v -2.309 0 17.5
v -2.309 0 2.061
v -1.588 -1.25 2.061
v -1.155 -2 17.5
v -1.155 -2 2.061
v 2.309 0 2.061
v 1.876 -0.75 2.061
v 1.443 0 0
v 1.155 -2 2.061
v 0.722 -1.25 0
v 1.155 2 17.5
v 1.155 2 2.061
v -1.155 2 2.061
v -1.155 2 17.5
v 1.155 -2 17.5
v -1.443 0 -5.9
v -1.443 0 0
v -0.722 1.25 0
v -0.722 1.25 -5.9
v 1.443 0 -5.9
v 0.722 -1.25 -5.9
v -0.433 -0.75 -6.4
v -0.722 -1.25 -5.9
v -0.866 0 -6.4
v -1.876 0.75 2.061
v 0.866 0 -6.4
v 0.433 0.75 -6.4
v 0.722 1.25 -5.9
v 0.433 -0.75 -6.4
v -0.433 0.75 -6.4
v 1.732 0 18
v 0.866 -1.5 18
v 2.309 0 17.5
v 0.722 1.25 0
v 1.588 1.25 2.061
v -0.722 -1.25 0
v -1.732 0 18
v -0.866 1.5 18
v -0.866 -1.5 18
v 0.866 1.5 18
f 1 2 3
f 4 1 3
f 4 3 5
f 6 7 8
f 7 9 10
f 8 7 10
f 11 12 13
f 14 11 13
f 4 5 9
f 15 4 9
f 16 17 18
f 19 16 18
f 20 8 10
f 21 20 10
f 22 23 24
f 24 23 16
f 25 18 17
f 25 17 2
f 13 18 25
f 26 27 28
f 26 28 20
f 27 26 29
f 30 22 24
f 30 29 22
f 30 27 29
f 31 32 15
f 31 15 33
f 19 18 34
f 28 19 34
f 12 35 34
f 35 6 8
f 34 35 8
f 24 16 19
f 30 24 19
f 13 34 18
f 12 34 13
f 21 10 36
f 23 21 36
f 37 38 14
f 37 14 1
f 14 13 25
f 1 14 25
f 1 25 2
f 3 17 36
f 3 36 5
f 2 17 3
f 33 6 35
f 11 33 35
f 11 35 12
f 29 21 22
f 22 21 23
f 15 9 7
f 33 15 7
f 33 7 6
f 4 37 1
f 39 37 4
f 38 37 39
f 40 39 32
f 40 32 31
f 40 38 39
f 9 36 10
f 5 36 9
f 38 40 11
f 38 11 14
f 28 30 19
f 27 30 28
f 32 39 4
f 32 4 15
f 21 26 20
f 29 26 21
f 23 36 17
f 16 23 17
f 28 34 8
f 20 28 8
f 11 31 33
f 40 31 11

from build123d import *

# Parameters (mm, degrees)
EXTRUDE_1_DEPTH  = 18
CHAMFER_1_SIZE   = 0.5
EXTRUDE_2_DEPTH  = 6.4
CHAMFER_3_SIZE   = 0.75
CHAMFER_3_SIZE_2 = 2.060608065
CHAMFER_4_SIZE   = 0.5


with BuildPart() as part:
    # 草图1 → 凸台-拉伸1 (new body)
    with BuildSketch(Plane.XY):
        Polygon((2.309401077, 0), (1.154700538, 2), (-1.154700538, 2), (-2.309401077, 0), (-1.154700538, -2), (1.154700538, -2), align=None)
    extrude(amount=EXTRUDE_1_DEPTH)

    # 倒角1
    chamfer_1_edges = [part.edges().sort_by_distance(p)[0] for p in [
        (0, 2, 18),
        (-1.732050808, 1, 18),
        (-1.732050808, -1, 18),
        (0, -2, 18),
        (1.732050808, -1, 18),
        (1.732050808, 1, 18),
    ]]
    chamfer(chamfer_1_edges, length=CHAMFER_1_SIZE)

    # 草图2 → 凸台-拉伸2 (add)
    with BuildSketch(Plane(origin=(0, 0, 0), x_dir=(-1, 0, 0), z_dir=(0, 0, -1))):
        Polygon((1.443375673, 0), (0.721687836, 1.25), (-0.721687836, 1.25), (-1.443375673, 0), (-0.721687836, -1.25), (0.721687836, -1.25), align=None)
    extrude(amount=EXTRUDE_2_DEPTH)

    # 倒角3
    # the kernel refuses this chamfer: 2.060608065, 0.75 mm, written as the material it takes off along each edge
    with BuildSketch(Plane(origin=(-6.500319125, -2, 0), x_dir=(-1.0524294974817634e-14, 0.9950833631817486, -0.09904090225205059), z_dir=(1, 0, 0))) as chamfer_3_piece_1_section:
        Polygon((CHAMFER_3_SIZE * 0.995083363182, CHAMFER_3_SIZE * 0.0990409022521), (-CHAMFER_3_SIZE_2 * 0.0990409022324, CHAMFER_3_SIZE_2 * 0.995083362984), (0, 0), align=None)
    chamfer_3_piece_1 = extrude(amount=13.000638251, mode=Mode.PRIVATE)
    chamfer_3_piece_1 = split(chamfer_3_piece_1, bisect_by=Plane(origin=(-1.179179606, -0.457601011, 0.71229118), z_dir=(-0.8660254037844392, -0.4999999999999994, 0)), keep=Keep.TOP, mode=Mode.PRIVATE)
    chamfer_3_piece_1 = split(chamfer_3_piece_1, bisect_by=Plane(origin=(-3.459667972, -1.25, 0.71229118), z_dir=(0, -1, 0)), keep=Keep.TOP, mode=Mode.PRIVATE)
    add(chamfer_3_piece_1, mode=Mode.SUBTRACT)
    with BuildSketch(Plane(origin=(-6.500319125, -2, 0), x_dir=(-1.0524294974817634e-14, 0.9950833631817486, -0.09904090225205059), z_dir=(1, 0, 0))) as chamfer_3_piece_2_section:
        Polygon((CHAMFER_3_SIZE * 0.995083363182, CHAMFER_3_SIZE * 0.0990409022521), (-CHAMFER_3_SIZE_2 * 0.0990409022324, CHAMFER_3_SIZE_2 * 0.995083362984), (0, 0), align=None)
    chamfer_3_piece_2 = extrude(amount=13.000638251, mode=Mode.PRIVATE)
    chamfer_3_piece_2 = split(chamfer_3_piece_2, bisect_by=Plane(origin=(-0.338481018, -1.91373368, 0.629088335), z_dir=(0.8660254037844392, 0.4999999999999994, 0)), keep=Keep.TOP, mode=Mode.PRIVATE)
    chamfer_3_piece_2 = split(chamfer_3_piece_2, bisect_by=Plane(origin=(0, -1.25, 0.629088335), z_dir=(0, -1, 0)), keep=Keep.TOP, mode=Mode.PRIVATE)
    chamfer_3_piece_2 = split(chamfer_3_piece_2, bisect_by=Plane(origin=(0.338481018, -1.91373368, 0.629088335), z_dir=(-0.8660254037844385, 0.5000000000000003, 0)), keep=Keep.TOP, mode=Mode.PRIVATE)
    add(chamfer_3_piece_2, mode=Mode.SUBTRACT)
    with BuildSketch(Plane(origin=(-6.500319125, -2, 0), x_dir=(-1.0524294974817634e-14, 0.9950833631817486, -0.09904090225205059), z_dir=(1, 0, 0))) as chamfer_3_piece_3_section:
        Polygon((CHAMFER_3_SIZE * 0.995083363182, CHAMFER_3_SIZE * 0.0990409022521), (-CHAMFER_3_SIZE_2 * 0.0990409022324, CHAMFER_3_SIZE_2 * 0.995083362984), (0, 0), align=None)
    chamfer_3_piece_3 = extrude(amount=13.000638251, mode=Mode.PRIVATE)
    chamfer_3_piece_3 = split(chamfer_3_piece_3, bisect_by=Plane(origin=(3.459667972, -1.25, 0.71229118), z_dir=(0, -1, 0)), keep=Keep.TOP, mode=Mode.PRIVATE)
    chamfer_3_piece_3 = split(chamfer_3_piece_3, bisect_by=Plane(origin=(1.179179606, -0.457601011, 0.71229118), z_dir=(0.8660254037844385, -0.5000000000000003, 0)), keep=Keep.TOP, mode=Mode.PRIVATE)
    add(chamfer_3_piece_3, mode=Mode.SUBTRACT)
    with BuildSketch(Plane(origin=(-4.98221037, 4.629441495, 0), x_dir=(0.8617674713986471, 0.49754168159088125, -0.09904090225205053), z_dir=(0.500000000000007, -0.8660254037844347, 0))) as chamfer_3_piece_4_section:
        Polygon((CHAMFER_3_SIZE * 0.995083363182, CHAMFER_3_SIZE * 0.0990409022521), (-CHAMFER_3_SIZE_2 * 0.0990409022324, CHAMFER_3_SIZE_2 * 0.995083362984), (0, 0), align=None)
    chamfer_3_piece_4 = extrude(amount=13.000638251, mode=Mode.PRIVATE)
    chamfer_3_piece_4 = split(chamfer_3_piece_4, bisect_by=Plane(origin=(-2.812365741, 2.371160352, 0.71229118), z_dir=(-0.8660254037844392, -0.4999999999999994, 0)), keep=Keep.TOP, mode=Mode.PRIVATE)
    chamfer_3_piece_4 = split(chamfer_3_piece_4, bisect_by=Plane(origin=(-0.985883903, 0.792398989, 0.71229118), z_dir=(-0.8660254037844387, 0.5000000000000003, 0)), keep=Keep.TOP, mode=Mode.PRIVATE)
    add(chamfer_3_piece_4, mode=Mode.SUBTRACT)
    with BuildSketch(Plane(origin=(-4.98221037, 4.629441495, 0), x_dir=(0.8617674713986471, 0.49754168159088125, -0.09904090225205053), z_dir=(0.500000000000007, -0.8660254037844347, 0))) as chamfer_3_piece_5_section:
        Polygon((CHAMFER_3_SIZE * 0.995083363182, CHAMFER_3_SIZE * 0.0990409022521), (-CHAMFER_3_SIZE_2 * 0.0990409022324, CHAMFER_3_SIZE_2 * 0.995083362984), (0, 0), align=None)
    chamfer_3_piece_5 = extrude(amount=13.000638251, mode=Mode.PRIVATE)
    chamfer_3_piece_5 = split(chamfer_3_piece_5, bisect_by=Plane(origin=(-1.082531755, -0.625, 0.629088335), z_dir=(-0.8660254037844392, -0.4999999999999994, 0)), keep=Keep.TOP, mode=Mode.PRIVATE)
    chamfer_3_piece_5 = split(chamfer_3_piece_5, bisect_by=Plane(origin=(-1.488101474, -1.25, 0.629088335), z_dir=(0, 1, 0)), keep=Keep.TOP, mode=Mode.PRIVATE)
    chamfer_3_piece_5 = split(chamfer_3_piece_5, bisect_by=Plane(origin=(-1.826582492, -0.66373368, 0.629088335), z_dir=(0.8660254037844387, -0.5000000000000003, 0)), keep=Keep.TOP, mode=Mode.PRIVATE)
    add(chamfer_3_piece_5, mode=Mode.SUBTRACT)
    with BuildSketch(Plane(origin=(-4.98221037, 4.629441495, 0), x_dir=(0.8617674713986471, 0.49754168159088125, -0.09904090225205053), z_dir=(0.500000000000007, -0.8660254037844347, 0))) as chamfer_3_piece_6_section:
        Polygon((CHAMFER_3_SIZE * 0.995083363182, CHAMFER_3_SIZE * 0.0990409022521), (-CHAMFER_3_SIZE_2 * 0.0990409022324, CHAMFER_3_SIZE_2 * 0.995083362984), (0, 0), align=None)
    chamfer_3_piece_6 = extrude(amount=13.000638251, mode=Mode.PRIVATE)
    chamfer_3_piece_6 = split(chamfer_3_piece_6, bisect_by=Plane(origin=(0.647302231, -3.621160352, 0.71229118), z_dir=(-0.8660254037844392, -0.4999999999999994, 0)), keep=Keep.TOP, mode=Mode.PRIVATE)
    chamfer_3_piece_6 = split(chamfer_3_piece_6, bisect_by=Plane(origin=(0.193295703, -1.25, 0.71229118), z_dir=(0, -1, 0)), keep=Keep.TOP, mode=Mode.PRIVATE)
    add(chamfer_3_piece_6, mode=Mode.SUBTRACT)
    with BuildSketch(Plane(origin=(1.518108755, 6.629441495, 0), x_dir=(0.861767471398654, -0.4975416815908692, -0.09904090225205063), z_dir=(-0.4999999999999949, -0.8660254037844416, 0))) as chamfer_3_piece_7_section:
        Polygon((CHAMFER_3_SIZE * 0.995083363182, CHAMFER_3_SIZE * 0.0990409022521), (-CHAMFER_3_SIZE_2 * 0.0990409022324, CHAMFER_3_SIZE_2 * 0.995083362984), (0, 0), align=None)
    chamfer_3_piece_7 = extrude(amount=13.000638251, mode=Mode.PRIVATE)
    chamfer_3_piece_7 = split(chamfer_3_piece_7, bisect_by=Plane(origin=(0.193295703, 1.25, 0.71229118), z_dir=(0, 1, 0)), keep=Keep.TOP, mode=Mode.PRIVATE)
    chamfer_3_piece_7 = split(chamfer_3_piece_7, bisect_by=Plane(origin=(0.647302231, 3.621160352, 0.71229118), z_dir=(-0.8660254037844387, 0.5000000000000003, 0)), keep=Keep.TOP, mode=Mode.PRIVATE)
    add(chamfer_3_piece_7, mode=Mode.SUBTRACT)
    with BuildSketch(Plane(origin=(1.518108755, 6.629441495, 0), x_dir=(0.861767471398654, -0.4975416815908692, -0.09904090225205063), z_dir=(-0.4999999999999949, -0.8660254037844416, 0))) as chamfer_3_piece_8_section:
        Polygon((CHAMFER_3_SIZE * 0.995083363182, CHAMFER_3_SIZE * 0.0990409022521), (-CHAMFER_3_SIZE_2 * 0.0990409022324, CHAMFER_3_SIZE_2 * 0.995083362984), (0, 0), align=None)
    chamfer_3_piece_8 = extrude(amount=13.000638251, mode=Mode.PRIVATE)
    chamfer_3_piece_8 = split(chamfer_3_piece_8, bisect_by=Plane(origin=(-1.826582492, 0.66373368, 0.629088335), z_dir=(0.8660254037844392, 0.4999999999999994, 0)), keep=Keep.TOP, mode=Mode.PRIVATE)
    chamfer_3_piece_8 = split(chamfer_3_piece_8, bisect_by=Plane(origin=(-1.488101474, 1.25, 0.629088335), z_dir=(0, -1, 0)), keep=Keep.TOP, mode=Mode.PRIVATE)
    chamfer_3_piece_8 = split(chamfer_3_piece_8, bisect_by=Plane(origin=(-1.082531755, 0.625, 0.629088335), z_dir=(-0.8660254037844387, 0.5000000000000003, 0)), keep=Keep.TOP, mode=Mode.PRIVATE)
    add(chamfer_3_piece_8, mode=Mode.SUBTRACT)
    with BuildSketch(Plane(origin=(1.518108755, 6.629441495, 0), x_dir=(0.861767471398654, -0.4975416815908692, -0.09904090225205063), z_dir=(-0.4999999999999949, -0.8660254037844416, 0))) as chamfer_3_piece_9_section:
        Polygon((CHAMFER_3_SIZE * 0.995083363182, CHAMFER_3_SIZE * 0.0990409022521), (-CHAMFER_3_SIZE_2 * 0.0990409022324, CHAMFER_3_SIZE_2 * 0.995083362984), (0, 0), align=None)
    chamfer_3_piece_9 = extrude(amount=13.000638251, mode=Mode.PRIVATE)
    chamfer_3_piece_9 = split(chamfer_3_piece_9, bisect_by=Plane(origin=(-0.985883903, -0.792398989, 0.71229118), z_dir=(-0.8660254037844392, -0.4999999999999994, 0)), keep=Keep.TOP, mode=Mode.PRIVATE)
    chamfer_3_piece_9 = split(chamfer_3_piece_9, bisect_by=Plane(origin=(-2.812365741, -2.371160352, 0.71229118), z_dir=(-0.8660254037844387, 0.5000000000000003, 0)), keep=Keep.TOP, mode=Mode.PRIVATE)
    add(chamfer_3_piece_9, mode=Mode.SUBTRACT)
    with BuildSketch(Plane(origin=(6.500319125, 2, 0), x_dir=(3.5399901278932047e-15, -0.9950833631817486, -0.09904090225205059), z_dir=(-1, 0, 0))) as chamfer_3_piece_10_section:
        Polygon((CHAMFER_3_SIZE * 0.995083363182, CHAMFER_3_SIZE * 0.0990409022521), (-CHAMFER_3_SIZE_2 * 0.0990409022324, CHAMFER_3_SIZE_2 * 0.995083362984), (0, 0), align=None)
    chamfer_3_piece_10 = extrude(amount=13.000638251, mode=Mode.PRIVATE)
    chamfer_3_piece_10 = split(chamfer_3_piece_10, bisect_by=Plane(origin=(1.179179606, 0.457601011, 0.71229118), z_dir=(0.8660254037844389, 0.4999999999999995, 0)), keep=Keep.TOP, mode=Mode.PRIVATE)
    chamfer_3_piece_10 = split(chamfer_3_piece_10, bisect_by=Plane(origin=(3.459667972, 1.25, 0.71229118), z_dir=(0, 1, 0)), keep=Keep.TOP, mode=Mode.PRIVATE)
    add(chamfer_3_piece_10, mode=Mode.SUBTRACT)
    with BuildSketch(Plane(origin=(6.500319125, 2, 0), x_dir=(3.5399901278932047e-15, -0.9950833631817486, -0.09904090225205059), z_dir=(-1, 0, 0))) as chamfer_3_piece_11_section:
        Polygon((CHAMFER_3_SIZE * 0.995083363182, CHAMFER_3_SIZE * 0.0990409022521), (-CHAMFER_3_SIZE_2 * 0.0990409022324, CHAMFER_3_SIZE_2 * 0.995083362984), (0, 0), align=None)
    chamfer_3_piece_11 = extrude(amount=13.000638251, mode=Mode.PRIVATE)
    chamfer_3_piece_11 = split(chamfer_3_piece_11, bisect_by=Plane(origin=(0.338481018, 1.91373368, 0.629088335), z_dir=(-0.8660254037844389, -0.4999999999999995, 0)), keep=Keep.TOP, mode=Mode.PRIVATE)
    chamfer_3_piece_11 = split(chamfer_3_piece_11, bisect_by=Plane(origin=(0, 1.25, 0.629088335), z_dir=(0, 1, 0)), keep=Keep.TOP, mode=Mode.PRIVATE)
    chamfer_3_piece_11 = split(chamfer_3_piece_11, bisect_by=Plane(origin=(-0.338481018, 1.91373368, 0.629088335), z_dir=(0.8660254037844387, -0.5000000000000003, 0)), keep=Keep.TOP, mode=Mode.PRIVATE)
    add(chamfer_3_piece_11, mode=Mode.SUBTRACT)
    with BuildSketch(Plane(origin=(6.500319125, 2, 0), x_dir=(3.5399901278932047e-15, -0.9950833631817486, -0.09904090225205059), z_dir=(-1, 0, 0))) as chamfer_3_piece_12_section:
        Polygon((CHAMFER_3_SIZE * 0.995083363182, CHAMFER_3_SIZE * 0.0990409022521), (-CHAMFER_3_SIZE_2 * 0.0990409022324, CHAMFER_3_SIZE_2 * 0.995083362984), (0, 0), align=None)
    chamfer_3_piece_12 = extrude(amount=13.000638251, mode=Mode.PRIVATE)
    chamfer_3_piece_12 = split(chamfer_3_piece_12, bisect_by=Plane(origin=(-3.459667972, 1.25, 0.71229118), z_dir=(0, 1, 0)), keep=Keep.TOP, mode=Mode.PRIVATE)
    chamfer_3_piece_12 = split(chamfer_3_piece_12, bisect_by=Plane(origin=(-1.179179606, 0.457601011, 0.71229118), z_dir=(-0.8660254037844387, 0.5000000000000003, 0)), keep=Keep.TOP, mode=Mode.PRIVATE)
    add(chamfer_3_piece_12, mode=Mode.SUBTRACT)
    with BuildSketch(Plane(origin=(4.98221037, -4.629441495, 0), x_dir=(0.011417729324999642, 0.006592029099322844, 0.9999130865277316), z_dir=(-0.500000000000001, 0.866025403784438, 0))) as chamfer_3_piece_13_section:
        Polygon((CHAMFER_3_SIZE_2 * 0.999913086329, -CHAMFER_3_SIZE_2 * 0.013184058196), (-CHAMFER_3_SIZE * 0.0131840581986, -CHAMFER_3_SIZE * 0.999913086528), (0, 0), align=None)
    chamfer_3_piece_13 = extrude(amount=13.000638251, mode=Mode.PRIVATE)
    chamfer_3_piece_13 = split(chamfer_3_piece_13, bisect_by=Plane(origin=(0.985883903, -0.792398989, 0.71229118), z_dir=(0.8660254037844385, -0.5000000000000003, 0)), keep=Keep.TOP, mode=Mode.PRIVATE)
    chamfer_3_piece_13 = split(chamfer_3_piece_13, bisect_by=Plane(origin=(2.812365741, -2.371160352, 0.71229118), z_dir=(0.8660254037844389, 0.4999999999999995, 0)), keep=Keep.TOP, mode=Mode.PRIVATE)
    add(chamfer_3_piece_13, mode=Mode.SUBTRACT)
    with BuildSketch(Plane(origin=(4.98221037, -4.629441495, 0), x_dir=(0.011417729324999642, 0.006592029099322844, 0.9999130865277316), z_dir=(-0.500000000000001, 0.866025403784438, 0))) as chamfer_3_piece_14_section:
        Polygon((CHAMFER_3_SIZE_2 * 0.999913086329, -CHAMFER_3_SIZE_2 * 0.013184058196), (-CHAMFER_3_SIZE * 0.0131840581986, -CHAMFER_3_SIZE * 0.999913086528), (0, 0), align=None)
    chamfer_3_piece_14 = extrude(amount=13.000638251, mode=Mode.PRIVATE)
    chamfer_3_piece_14 = split(chamfer_3_piece_14, bisect_by=Plane(origin=(1.826582492, 0.66373368, 0.629088335), z_dir=(-0.8660254037844385, 0.5000000000000003, 0)), keep=Keep.TOP, mode=Mode.PRIVATE)
    chamfer_3_piece_14 = split(chamfer_3_piece_14, bisect_by=Plane(origin=(1.082531755, 0.625, 0.629088335), z_dir=(0.8660254037844389, 0.4999999999999995, 0)), keep=Keep.TOP, mode=Mode.PRIVATE)
    chamfer_3_piece_14 = split(chamfer_3_piece_14, bisect_by=Plane(origin=(1.488101474, 1.25, 0.629088335), z_dir=(0, -1, 0)), keep=Keep.TOP, mode=Mode.PRIVATE)
    add(chamfer_3_piece_14, mode=Mode.SUBTRACT)
    with BuildSketch(Plane(origin=(4.98221037, -4.629441495, 0), x_dir=(0.011417729324999642, 0.006592029099322844, 0.9999130865277316), z_dir=(-0.500000000000001, 0.866025403784438, 0))) as chamfer_3_piece_15_section:
        Polygon((CHAMFER_3_SIZE_2 * 0.999913086329, -CHAMFER_3_SIZE_2 * 0.013184058196), (-CHAMFER_3_SIZE * 0.0131840581986, -CHAMFER_3_SIZE * 0.999913086528), (0, 0), align=None)
    chamfer_3_piece_15 = extrude(amount=13.000638251, mode=Mode.PRIVATE)
    chamfer_3_piece_15 = split(chamfer_3_piece_15, bisect_by=Plane(origin=(-0.647302231, 3.621160352, 0.71229118), z_dir=(0.8660254037844389, 0.4999999999999995, 0)), keep=Keep.TOP, mode=Mode.PRIVATE)
    chamfer_3_piece_15 = split(chamfer_3_piece_15, bisect_by=Plane(origin=(-0.193295703, 1.25, 0.71229118), z_dir=(0, 1, 0)), keep=Keep.TOP, mode=Mode.PRIVATE)
    add(chamfer_3_piece_15, mode=Mode.SUBTRACT)
    with BuildSketch(Plane(origin=(-1.518108755, -6.629441495, 0), x_dir=(0.011417729324999607, -0.006592029099322722, 0.9999130865277316), z_dir=(0.4999999999999951, 0.8660254037844415, 0))) as chamfer_3_piece_16_section:
        Polygon((CHAMFER_3_SIZE_2 * 0.999913086329, -CHAMFER_3_SIZE_2 * 0.013184058196), (-CHAMFER_3_SIZE * 0.0131840581986, -CHAMFER_3_SIZE * 0.999913086528), (0, 0), align=None)
    chamfer_3_piece_16 = extrude(amount=13.000638251, mode=Mode.PRIVATE)
    chamfer_3_piece_16 = split(chamfer_3_piece_16, bisect_by=Plane(origin=(-0.193295703, -1.25, 0.71229118), z_dir=(0, -1, 0)), keep=Keep.TOP, mode=Mode.PRIVATE)
    chamfer_3_piece_16 = split(chamfer_3_piece_16, bisect_by=Plane(origin=(-0.647302231, -3.621160352, 0.71229118), z_dir=(0.8660254037844385, -0.5000000000000003, 0)), keep=Keep.TOP, mode=Mode.PRIVATE)
    add(chamfer_3_piece_16, mode=Mode.SUBTRACT)
    with BuildSketch(Plane(origin=(-1.518108755, -6.629441495, 0), x_dir=(0.011417729324999607, -0.006592029099322722, 0.9999130865277316), z_dir=(0.4999999999999951, 0.8660254037844415, 0))) as chamfer_3_piece_17_section:
        Polygon((CHAMFER_3_SIZE_2 * 0.999913086329, -CHAMFER_3_SIZE_2 * 0.013184058196), (-CHAMFER_3_SIZE * 0.0131840581986, -CHAMFER_3_SIZE * 0.999913086528), (0, 0), align=None)
    chamfer_3_piece_17 = extrude(amount=13.000638251, mode=Mode.PRIVATE)
    chamfer_3_piece_17 = split(chamfer_3_piece_17, bisect_by=Plane(origin=(1.488101474, -1.25, 0.629088335), z_dir=(0, 1, 0)), keep=Keep.TOP, mode=Mode.PRIVATE)
    chamfer_3_piece_17 = split(chamfer_3_piece_17, bisect_by=Plane(origin=(1.082531755, -0.625, 0.629088335), z_dir=(0.8660254037844385, -0.5000000000000003, 0)), keep=Keep.TOP, mode=Mode.PRIVATE)
    chamfer_3_piece_17 = split(chamfer_3_piece_17, bisect_by=Plane(origin=(1.826582492, -0.66373368, 0.629088335), z_dir=(-0.8660254037844389, -0.4999999999999995, 0)), keep=Keep.TOP, mode=Mode.PRIVATE)
    add(chamfer_3_piece_17, mode=Mode.SUBTRACT)
    with BuildSketch(Plane(origin=(-1.518108755, -6.629441495, 0), x_dir=(0.011417729324999607, -0.006592029099322722, 0.9999130865277316), z_dir=(0.4999999999999951, 0.8660254037844415, 0))) as chamfer_3_piece_18_section:
        Polygon((CHAMFER_3_SIZE_2 * 0.999913086329, -CHAMFER_3_SIZE_2 * 0.013184058196), (-CHAMFER_3_SIZE * 0.0131840581986, -CHAMFER_3_SIZE * 0.999913086528), (0, 0), align=None)
    chamfer_3_piece_18 = extrude(amount=13.000638251, mode=Mode.PRIVATE)
    chamfer_3_piece_18 = split(chamfer_3_piece_18, bisect_by=Plane(origin=(2.812365741, 2.371160352, 0.71229118), z_dir=(0.8660254037844385, -0.5000000000000003, 0)), keep=Keep.TOP, mode=Mode.PRIVATE)
    chamfer_3_piece_18 = split(chamfer_3_piece_18, bisect_by=Plane(origin=(0.985883903, 0.792398989, 0.71229118), z_dir=(0.8660254037844389, 0.4999999999999995, 0)), keep=Keep.TOP, mode=Mode.PRIVATE)
    add(chamfer_3_piece_18, mode=Mode.SUBTRACT)

    # 倒角4
    chamfer_4_edges = [part.edges().sort_by_distance(p)[0] for p in [
        (-1.082531755, -0.625, -6.4),
        (-1.082531755, 0.625, -6.4),
        (0, 1.25, -6.4),
        (1.082531755, 0.625, -6.4),
        (1.082531755, -0.625, -6.4),
        (0, -1.25, -6.4),
    ]]
    chamfer(chamfer_4_edges, length=CHAMFER_4_SIZE)


solid = part.part
